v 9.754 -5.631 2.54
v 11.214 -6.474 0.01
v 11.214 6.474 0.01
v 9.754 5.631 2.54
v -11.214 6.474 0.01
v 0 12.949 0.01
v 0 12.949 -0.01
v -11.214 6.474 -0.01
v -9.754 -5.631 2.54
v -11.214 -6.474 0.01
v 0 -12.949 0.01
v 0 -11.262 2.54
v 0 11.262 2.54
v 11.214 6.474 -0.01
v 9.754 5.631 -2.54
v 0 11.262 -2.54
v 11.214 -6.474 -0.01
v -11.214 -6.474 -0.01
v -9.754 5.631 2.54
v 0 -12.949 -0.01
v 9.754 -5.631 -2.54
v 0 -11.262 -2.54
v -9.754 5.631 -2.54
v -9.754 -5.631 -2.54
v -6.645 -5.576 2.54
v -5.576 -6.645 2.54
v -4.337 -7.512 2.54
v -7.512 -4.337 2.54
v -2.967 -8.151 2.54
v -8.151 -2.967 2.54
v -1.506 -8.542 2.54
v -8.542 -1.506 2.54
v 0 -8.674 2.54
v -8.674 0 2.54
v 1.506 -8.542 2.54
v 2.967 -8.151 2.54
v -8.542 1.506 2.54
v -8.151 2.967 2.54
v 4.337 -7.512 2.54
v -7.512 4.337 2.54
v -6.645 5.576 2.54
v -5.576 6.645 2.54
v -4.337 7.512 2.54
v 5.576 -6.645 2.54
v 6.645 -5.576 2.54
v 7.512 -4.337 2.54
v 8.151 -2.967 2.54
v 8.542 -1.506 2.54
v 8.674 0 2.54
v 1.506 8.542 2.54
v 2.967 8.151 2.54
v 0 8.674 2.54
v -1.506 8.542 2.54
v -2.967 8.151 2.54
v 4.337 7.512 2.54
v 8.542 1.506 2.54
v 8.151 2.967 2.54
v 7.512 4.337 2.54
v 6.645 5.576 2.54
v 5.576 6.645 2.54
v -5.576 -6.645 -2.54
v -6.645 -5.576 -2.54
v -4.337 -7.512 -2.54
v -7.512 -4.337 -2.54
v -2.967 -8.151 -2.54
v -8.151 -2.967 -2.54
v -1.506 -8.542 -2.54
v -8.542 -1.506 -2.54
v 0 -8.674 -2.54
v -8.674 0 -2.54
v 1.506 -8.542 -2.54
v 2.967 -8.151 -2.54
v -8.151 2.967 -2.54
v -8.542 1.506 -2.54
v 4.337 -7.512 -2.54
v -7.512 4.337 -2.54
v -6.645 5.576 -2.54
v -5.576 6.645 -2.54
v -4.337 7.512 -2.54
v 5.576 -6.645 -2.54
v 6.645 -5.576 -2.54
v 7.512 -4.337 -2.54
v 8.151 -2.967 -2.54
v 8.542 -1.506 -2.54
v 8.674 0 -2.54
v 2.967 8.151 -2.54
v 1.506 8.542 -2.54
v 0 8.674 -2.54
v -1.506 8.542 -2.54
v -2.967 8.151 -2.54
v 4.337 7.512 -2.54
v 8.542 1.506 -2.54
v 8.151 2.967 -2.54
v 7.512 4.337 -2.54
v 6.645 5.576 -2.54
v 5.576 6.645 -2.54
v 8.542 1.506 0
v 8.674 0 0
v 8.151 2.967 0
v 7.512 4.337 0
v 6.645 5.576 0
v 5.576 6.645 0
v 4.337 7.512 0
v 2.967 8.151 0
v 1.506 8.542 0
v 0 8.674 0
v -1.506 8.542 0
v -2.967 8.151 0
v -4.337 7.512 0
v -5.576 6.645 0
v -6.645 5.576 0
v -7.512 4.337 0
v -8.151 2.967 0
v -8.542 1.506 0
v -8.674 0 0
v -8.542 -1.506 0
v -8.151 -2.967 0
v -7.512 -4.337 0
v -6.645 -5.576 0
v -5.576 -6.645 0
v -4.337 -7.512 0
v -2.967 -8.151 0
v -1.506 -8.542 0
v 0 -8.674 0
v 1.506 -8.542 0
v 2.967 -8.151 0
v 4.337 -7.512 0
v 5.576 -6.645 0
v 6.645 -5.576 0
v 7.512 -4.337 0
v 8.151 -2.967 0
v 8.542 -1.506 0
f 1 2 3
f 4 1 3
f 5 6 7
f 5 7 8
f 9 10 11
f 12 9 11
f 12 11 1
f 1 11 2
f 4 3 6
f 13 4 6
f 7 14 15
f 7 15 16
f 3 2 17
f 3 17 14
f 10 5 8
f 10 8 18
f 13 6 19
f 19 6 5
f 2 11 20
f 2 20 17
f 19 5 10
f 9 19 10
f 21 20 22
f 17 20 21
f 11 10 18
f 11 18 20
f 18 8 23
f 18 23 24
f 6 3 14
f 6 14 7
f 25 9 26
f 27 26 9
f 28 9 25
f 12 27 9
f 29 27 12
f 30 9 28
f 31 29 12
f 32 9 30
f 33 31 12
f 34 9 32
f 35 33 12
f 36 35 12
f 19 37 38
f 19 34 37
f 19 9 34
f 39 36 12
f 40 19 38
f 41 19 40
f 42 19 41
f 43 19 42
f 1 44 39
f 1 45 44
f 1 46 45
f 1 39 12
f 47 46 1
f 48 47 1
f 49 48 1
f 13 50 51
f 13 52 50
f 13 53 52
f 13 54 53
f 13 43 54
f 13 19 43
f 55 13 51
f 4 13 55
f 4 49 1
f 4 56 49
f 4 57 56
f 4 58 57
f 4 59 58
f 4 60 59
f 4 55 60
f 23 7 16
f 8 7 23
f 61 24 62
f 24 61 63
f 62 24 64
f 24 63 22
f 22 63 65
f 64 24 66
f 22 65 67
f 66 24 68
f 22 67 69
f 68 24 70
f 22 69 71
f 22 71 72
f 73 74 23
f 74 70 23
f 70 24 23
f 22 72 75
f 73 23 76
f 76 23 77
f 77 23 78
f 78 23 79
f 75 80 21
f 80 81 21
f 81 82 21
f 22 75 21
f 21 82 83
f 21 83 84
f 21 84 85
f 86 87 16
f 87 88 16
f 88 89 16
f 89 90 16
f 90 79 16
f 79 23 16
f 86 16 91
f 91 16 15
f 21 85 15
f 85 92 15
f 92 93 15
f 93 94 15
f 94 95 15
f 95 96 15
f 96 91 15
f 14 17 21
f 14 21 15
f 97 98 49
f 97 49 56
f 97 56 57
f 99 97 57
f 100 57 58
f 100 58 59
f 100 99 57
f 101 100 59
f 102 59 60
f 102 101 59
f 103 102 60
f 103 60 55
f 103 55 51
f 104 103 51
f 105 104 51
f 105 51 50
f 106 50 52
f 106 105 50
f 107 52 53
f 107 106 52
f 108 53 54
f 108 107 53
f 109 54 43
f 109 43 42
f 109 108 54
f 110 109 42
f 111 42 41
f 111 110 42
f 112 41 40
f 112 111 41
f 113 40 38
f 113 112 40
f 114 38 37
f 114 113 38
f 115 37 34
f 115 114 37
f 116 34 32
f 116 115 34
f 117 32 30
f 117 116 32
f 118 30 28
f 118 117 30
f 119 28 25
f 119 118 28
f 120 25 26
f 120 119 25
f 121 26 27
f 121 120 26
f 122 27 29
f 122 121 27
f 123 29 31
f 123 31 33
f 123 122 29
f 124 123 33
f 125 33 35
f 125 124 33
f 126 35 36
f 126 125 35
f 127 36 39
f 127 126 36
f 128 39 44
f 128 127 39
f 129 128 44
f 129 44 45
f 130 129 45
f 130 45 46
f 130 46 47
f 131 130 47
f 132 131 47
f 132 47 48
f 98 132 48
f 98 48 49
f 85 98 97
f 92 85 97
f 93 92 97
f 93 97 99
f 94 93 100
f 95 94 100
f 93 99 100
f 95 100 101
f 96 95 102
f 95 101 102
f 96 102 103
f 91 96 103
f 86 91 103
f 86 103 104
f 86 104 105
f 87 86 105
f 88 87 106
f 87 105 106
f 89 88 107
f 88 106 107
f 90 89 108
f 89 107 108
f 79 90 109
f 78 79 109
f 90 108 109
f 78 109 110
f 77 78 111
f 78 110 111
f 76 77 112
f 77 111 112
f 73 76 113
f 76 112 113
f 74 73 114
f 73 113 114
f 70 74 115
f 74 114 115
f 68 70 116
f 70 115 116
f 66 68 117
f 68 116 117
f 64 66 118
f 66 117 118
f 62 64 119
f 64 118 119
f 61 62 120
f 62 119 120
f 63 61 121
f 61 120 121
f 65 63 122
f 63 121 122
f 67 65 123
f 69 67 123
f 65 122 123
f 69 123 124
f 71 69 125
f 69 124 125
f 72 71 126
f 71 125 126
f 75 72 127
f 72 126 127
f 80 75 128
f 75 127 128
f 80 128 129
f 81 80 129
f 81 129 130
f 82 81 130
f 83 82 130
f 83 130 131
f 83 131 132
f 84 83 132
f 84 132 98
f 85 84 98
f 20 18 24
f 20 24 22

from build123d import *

# Parameters (mm, degrees)
F0_R          = 8.6741
F1_DEPTH      = 2.54
F1_DEPTH_BACK = 2.54
F2_SIZE2      = 2.5296602045
F2_SIZE       = 1.4605
F3_SIZE2      = 2.5296602045
F3_SIZE       = 1.4605


with BuildPart() as f1:
    # F0 (on Top) → F1 (new body, two sides)
    with BuildSketch(Plane.XY) as f1_sk:
        Polygon((11.2141, -6.4744636537), (11.2141, 6.4744636537), (0, 12.9489273074), (-11.2141, 6.4744636537), (-11.2141, -6.4744636537), (0, -12.9489273074), align=None)
        Circle(F0_R, mode=Mode.SUBTRACT)
    extrude(amount=F1_DEPTH)
    extrude(f1_sk.sketch, amount=-F1_DEPTH_BACK)

    # F2
    f2_edges = [f1.edges().sort_by_distance(p)[0] for p in [
        (-5.60705, 9.711695, 2.54),
        (-11.2141, 0, 2.54),
        (-5.60705, -9.711695, 2.54),
        (5.60705, -9.711695, 2.54),
        (11.2141, 0, 2.54),
        (5.60705, 9.711695, 2.54),
    ]]
    f2_side = f1.faces().sort_by_distance((10.871504, 0, 2.54))[0]
    chamfer(f2_edges, length=F2_SIZE, length2=F2_SIZE2, reference=f2_side)

    # F3
    f3_edges = [f1.edges().sort_by_distance(p)[0] for p in [
        (-5.60705, 9.711695, -2.54),
        (-11.2141, 0, -2.54),
        (-5.60705, -9.711695, -2.54),
        (5.60705, -9.711695, -2.54),
        (11.2141, 0, -2.54),
        (5.60705, 9.711695, -2.54),
    ]]
    f3_side = f1.faces().sort_by_distance((10.871504, 0, -2.54))[0]
    chamfer(f3_edges, length=F3_SIZE, length2=F3_SIZE2, reference=f3_side)


solid = f1.part
